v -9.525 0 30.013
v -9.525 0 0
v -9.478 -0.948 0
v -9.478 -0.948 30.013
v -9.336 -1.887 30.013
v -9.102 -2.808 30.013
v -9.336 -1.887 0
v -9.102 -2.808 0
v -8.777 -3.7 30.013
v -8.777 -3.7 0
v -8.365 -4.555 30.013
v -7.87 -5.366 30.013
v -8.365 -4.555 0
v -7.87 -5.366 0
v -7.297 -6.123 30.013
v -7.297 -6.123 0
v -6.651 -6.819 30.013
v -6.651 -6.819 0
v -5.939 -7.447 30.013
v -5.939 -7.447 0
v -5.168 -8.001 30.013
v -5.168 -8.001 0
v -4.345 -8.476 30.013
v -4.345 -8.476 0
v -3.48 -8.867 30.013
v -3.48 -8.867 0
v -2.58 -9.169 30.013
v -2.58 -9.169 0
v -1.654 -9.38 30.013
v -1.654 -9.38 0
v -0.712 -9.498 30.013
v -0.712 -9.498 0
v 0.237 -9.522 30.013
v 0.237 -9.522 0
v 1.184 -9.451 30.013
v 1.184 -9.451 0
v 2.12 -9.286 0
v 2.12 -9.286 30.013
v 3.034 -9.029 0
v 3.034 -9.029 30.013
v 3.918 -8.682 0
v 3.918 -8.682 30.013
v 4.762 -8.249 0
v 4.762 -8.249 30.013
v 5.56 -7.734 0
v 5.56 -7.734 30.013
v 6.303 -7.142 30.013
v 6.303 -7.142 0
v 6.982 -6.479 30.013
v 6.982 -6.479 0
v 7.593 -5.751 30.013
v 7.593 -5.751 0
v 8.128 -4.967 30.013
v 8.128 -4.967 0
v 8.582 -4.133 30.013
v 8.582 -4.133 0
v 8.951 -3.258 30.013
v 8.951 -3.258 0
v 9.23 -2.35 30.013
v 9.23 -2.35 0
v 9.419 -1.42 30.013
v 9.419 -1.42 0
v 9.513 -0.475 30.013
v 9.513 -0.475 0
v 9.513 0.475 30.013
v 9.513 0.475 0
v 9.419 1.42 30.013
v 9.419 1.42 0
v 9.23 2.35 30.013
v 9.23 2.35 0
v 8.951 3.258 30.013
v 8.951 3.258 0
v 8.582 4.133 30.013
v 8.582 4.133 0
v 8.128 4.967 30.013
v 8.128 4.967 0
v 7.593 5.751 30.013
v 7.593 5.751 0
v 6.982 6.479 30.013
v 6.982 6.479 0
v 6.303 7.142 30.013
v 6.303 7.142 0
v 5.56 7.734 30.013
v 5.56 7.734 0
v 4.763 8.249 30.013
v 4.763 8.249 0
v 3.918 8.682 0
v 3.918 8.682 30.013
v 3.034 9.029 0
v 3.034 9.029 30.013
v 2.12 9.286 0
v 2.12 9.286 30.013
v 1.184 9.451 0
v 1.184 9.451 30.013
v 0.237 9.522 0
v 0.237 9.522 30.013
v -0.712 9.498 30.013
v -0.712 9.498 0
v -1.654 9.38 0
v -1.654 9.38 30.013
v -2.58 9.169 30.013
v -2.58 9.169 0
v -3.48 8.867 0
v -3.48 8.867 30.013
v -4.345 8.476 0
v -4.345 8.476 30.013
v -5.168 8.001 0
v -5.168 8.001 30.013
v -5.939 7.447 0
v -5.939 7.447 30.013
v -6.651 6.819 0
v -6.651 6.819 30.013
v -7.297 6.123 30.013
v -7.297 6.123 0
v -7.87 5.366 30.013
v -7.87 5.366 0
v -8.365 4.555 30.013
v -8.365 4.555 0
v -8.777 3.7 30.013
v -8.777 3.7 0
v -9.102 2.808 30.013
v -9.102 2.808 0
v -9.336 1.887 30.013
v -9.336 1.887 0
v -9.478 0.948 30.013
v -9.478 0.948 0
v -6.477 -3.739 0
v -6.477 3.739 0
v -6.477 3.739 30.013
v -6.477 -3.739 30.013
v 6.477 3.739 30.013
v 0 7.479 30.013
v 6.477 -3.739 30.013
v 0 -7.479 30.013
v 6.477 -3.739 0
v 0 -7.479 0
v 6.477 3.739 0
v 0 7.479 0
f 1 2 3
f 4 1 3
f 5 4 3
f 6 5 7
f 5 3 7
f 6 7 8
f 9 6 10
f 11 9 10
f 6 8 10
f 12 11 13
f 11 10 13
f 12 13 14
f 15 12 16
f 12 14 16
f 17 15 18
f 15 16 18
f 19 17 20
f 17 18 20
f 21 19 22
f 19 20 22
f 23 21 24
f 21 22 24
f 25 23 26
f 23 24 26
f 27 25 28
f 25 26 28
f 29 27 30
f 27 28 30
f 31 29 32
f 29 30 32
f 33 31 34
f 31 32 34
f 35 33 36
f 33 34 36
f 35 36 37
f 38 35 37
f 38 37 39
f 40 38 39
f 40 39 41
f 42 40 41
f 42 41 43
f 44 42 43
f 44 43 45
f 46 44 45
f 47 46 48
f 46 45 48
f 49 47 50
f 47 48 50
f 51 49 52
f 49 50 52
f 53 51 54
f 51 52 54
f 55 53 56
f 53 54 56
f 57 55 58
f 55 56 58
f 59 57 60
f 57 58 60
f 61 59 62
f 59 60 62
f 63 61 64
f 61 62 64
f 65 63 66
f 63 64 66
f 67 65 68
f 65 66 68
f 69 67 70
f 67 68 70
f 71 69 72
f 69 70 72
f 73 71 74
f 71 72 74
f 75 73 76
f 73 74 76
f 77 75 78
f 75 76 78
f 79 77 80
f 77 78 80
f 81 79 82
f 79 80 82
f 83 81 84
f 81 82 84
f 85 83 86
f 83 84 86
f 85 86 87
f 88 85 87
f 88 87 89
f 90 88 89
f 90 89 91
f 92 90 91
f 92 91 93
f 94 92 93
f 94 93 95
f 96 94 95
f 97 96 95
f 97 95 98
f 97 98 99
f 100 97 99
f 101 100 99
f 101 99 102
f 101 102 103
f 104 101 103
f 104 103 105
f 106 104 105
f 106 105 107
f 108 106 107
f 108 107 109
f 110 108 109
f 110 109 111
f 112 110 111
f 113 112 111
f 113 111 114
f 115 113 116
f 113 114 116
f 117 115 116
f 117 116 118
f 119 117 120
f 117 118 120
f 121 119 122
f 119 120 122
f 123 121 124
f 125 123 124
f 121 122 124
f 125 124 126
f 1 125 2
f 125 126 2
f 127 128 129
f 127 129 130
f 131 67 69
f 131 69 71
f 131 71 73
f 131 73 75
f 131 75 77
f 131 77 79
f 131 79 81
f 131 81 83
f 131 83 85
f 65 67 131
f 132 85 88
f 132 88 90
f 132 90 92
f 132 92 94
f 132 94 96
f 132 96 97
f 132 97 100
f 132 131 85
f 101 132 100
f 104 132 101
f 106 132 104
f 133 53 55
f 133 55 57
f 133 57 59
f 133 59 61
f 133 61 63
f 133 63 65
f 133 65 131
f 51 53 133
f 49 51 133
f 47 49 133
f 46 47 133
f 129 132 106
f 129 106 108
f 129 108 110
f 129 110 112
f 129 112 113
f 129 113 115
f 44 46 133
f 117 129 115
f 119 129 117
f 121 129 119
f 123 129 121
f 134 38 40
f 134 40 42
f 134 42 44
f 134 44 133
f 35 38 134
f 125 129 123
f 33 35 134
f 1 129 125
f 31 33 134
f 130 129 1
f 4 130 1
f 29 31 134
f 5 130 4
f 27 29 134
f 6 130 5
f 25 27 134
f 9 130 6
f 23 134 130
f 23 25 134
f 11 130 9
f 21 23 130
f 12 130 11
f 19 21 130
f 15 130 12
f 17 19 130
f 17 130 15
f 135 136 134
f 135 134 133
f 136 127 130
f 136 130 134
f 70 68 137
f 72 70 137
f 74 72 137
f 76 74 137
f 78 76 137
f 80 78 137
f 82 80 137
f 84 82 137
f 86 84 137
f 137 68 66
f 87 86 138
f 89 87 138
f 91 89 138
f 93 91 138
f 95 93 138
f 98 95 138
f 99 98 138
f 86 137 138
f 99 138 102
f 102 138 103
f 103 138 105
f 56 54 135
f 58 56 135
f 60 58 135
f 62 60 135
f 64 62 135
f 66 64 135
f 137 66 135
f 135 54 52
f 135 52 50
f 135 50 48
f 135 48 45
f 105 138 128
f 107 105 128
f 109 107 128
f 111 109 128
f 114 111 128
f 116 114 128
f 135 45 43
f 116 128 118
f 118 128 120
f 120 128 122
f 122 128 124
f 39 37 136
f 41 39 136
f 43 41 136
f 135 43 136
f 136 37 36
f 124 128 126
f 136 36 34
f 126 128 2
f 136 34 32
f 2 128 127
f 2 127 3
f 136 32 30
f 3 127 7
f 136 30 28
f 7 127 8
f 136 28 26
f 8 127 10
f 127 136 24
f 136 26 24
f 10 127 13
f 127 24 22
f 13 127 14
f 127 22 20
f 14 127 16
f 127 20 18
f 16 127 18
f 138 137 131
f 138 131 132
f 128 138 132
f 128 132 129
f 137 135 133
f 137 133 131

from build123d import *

# Parameters (mm, degrees)
SKETCH1_R           = 9.525
BOSS_EXTRUDE1_DEPTH = 30.01264


with BuildPart() as part:
    # Sketch1 → Boss-Extrude1 (new body)
    with BuildSketch(Plane.XY):
        with Locations(Location((0, 0, 0), (0, 0, 180))):
            Circle(SKETCH1_R)
        Polygon((0, 7.478995387), (-6.477, 3.739497694), (-6.477, -3.739497694), (0, -7.478995387), (6.477, -3.739497694), (6.477, 3.739497694), align=None, mode=Mode.SUBTRACT)
    extrude(amount=BOSS_EXTRUDE1_DEPTH)


solid = part.part
